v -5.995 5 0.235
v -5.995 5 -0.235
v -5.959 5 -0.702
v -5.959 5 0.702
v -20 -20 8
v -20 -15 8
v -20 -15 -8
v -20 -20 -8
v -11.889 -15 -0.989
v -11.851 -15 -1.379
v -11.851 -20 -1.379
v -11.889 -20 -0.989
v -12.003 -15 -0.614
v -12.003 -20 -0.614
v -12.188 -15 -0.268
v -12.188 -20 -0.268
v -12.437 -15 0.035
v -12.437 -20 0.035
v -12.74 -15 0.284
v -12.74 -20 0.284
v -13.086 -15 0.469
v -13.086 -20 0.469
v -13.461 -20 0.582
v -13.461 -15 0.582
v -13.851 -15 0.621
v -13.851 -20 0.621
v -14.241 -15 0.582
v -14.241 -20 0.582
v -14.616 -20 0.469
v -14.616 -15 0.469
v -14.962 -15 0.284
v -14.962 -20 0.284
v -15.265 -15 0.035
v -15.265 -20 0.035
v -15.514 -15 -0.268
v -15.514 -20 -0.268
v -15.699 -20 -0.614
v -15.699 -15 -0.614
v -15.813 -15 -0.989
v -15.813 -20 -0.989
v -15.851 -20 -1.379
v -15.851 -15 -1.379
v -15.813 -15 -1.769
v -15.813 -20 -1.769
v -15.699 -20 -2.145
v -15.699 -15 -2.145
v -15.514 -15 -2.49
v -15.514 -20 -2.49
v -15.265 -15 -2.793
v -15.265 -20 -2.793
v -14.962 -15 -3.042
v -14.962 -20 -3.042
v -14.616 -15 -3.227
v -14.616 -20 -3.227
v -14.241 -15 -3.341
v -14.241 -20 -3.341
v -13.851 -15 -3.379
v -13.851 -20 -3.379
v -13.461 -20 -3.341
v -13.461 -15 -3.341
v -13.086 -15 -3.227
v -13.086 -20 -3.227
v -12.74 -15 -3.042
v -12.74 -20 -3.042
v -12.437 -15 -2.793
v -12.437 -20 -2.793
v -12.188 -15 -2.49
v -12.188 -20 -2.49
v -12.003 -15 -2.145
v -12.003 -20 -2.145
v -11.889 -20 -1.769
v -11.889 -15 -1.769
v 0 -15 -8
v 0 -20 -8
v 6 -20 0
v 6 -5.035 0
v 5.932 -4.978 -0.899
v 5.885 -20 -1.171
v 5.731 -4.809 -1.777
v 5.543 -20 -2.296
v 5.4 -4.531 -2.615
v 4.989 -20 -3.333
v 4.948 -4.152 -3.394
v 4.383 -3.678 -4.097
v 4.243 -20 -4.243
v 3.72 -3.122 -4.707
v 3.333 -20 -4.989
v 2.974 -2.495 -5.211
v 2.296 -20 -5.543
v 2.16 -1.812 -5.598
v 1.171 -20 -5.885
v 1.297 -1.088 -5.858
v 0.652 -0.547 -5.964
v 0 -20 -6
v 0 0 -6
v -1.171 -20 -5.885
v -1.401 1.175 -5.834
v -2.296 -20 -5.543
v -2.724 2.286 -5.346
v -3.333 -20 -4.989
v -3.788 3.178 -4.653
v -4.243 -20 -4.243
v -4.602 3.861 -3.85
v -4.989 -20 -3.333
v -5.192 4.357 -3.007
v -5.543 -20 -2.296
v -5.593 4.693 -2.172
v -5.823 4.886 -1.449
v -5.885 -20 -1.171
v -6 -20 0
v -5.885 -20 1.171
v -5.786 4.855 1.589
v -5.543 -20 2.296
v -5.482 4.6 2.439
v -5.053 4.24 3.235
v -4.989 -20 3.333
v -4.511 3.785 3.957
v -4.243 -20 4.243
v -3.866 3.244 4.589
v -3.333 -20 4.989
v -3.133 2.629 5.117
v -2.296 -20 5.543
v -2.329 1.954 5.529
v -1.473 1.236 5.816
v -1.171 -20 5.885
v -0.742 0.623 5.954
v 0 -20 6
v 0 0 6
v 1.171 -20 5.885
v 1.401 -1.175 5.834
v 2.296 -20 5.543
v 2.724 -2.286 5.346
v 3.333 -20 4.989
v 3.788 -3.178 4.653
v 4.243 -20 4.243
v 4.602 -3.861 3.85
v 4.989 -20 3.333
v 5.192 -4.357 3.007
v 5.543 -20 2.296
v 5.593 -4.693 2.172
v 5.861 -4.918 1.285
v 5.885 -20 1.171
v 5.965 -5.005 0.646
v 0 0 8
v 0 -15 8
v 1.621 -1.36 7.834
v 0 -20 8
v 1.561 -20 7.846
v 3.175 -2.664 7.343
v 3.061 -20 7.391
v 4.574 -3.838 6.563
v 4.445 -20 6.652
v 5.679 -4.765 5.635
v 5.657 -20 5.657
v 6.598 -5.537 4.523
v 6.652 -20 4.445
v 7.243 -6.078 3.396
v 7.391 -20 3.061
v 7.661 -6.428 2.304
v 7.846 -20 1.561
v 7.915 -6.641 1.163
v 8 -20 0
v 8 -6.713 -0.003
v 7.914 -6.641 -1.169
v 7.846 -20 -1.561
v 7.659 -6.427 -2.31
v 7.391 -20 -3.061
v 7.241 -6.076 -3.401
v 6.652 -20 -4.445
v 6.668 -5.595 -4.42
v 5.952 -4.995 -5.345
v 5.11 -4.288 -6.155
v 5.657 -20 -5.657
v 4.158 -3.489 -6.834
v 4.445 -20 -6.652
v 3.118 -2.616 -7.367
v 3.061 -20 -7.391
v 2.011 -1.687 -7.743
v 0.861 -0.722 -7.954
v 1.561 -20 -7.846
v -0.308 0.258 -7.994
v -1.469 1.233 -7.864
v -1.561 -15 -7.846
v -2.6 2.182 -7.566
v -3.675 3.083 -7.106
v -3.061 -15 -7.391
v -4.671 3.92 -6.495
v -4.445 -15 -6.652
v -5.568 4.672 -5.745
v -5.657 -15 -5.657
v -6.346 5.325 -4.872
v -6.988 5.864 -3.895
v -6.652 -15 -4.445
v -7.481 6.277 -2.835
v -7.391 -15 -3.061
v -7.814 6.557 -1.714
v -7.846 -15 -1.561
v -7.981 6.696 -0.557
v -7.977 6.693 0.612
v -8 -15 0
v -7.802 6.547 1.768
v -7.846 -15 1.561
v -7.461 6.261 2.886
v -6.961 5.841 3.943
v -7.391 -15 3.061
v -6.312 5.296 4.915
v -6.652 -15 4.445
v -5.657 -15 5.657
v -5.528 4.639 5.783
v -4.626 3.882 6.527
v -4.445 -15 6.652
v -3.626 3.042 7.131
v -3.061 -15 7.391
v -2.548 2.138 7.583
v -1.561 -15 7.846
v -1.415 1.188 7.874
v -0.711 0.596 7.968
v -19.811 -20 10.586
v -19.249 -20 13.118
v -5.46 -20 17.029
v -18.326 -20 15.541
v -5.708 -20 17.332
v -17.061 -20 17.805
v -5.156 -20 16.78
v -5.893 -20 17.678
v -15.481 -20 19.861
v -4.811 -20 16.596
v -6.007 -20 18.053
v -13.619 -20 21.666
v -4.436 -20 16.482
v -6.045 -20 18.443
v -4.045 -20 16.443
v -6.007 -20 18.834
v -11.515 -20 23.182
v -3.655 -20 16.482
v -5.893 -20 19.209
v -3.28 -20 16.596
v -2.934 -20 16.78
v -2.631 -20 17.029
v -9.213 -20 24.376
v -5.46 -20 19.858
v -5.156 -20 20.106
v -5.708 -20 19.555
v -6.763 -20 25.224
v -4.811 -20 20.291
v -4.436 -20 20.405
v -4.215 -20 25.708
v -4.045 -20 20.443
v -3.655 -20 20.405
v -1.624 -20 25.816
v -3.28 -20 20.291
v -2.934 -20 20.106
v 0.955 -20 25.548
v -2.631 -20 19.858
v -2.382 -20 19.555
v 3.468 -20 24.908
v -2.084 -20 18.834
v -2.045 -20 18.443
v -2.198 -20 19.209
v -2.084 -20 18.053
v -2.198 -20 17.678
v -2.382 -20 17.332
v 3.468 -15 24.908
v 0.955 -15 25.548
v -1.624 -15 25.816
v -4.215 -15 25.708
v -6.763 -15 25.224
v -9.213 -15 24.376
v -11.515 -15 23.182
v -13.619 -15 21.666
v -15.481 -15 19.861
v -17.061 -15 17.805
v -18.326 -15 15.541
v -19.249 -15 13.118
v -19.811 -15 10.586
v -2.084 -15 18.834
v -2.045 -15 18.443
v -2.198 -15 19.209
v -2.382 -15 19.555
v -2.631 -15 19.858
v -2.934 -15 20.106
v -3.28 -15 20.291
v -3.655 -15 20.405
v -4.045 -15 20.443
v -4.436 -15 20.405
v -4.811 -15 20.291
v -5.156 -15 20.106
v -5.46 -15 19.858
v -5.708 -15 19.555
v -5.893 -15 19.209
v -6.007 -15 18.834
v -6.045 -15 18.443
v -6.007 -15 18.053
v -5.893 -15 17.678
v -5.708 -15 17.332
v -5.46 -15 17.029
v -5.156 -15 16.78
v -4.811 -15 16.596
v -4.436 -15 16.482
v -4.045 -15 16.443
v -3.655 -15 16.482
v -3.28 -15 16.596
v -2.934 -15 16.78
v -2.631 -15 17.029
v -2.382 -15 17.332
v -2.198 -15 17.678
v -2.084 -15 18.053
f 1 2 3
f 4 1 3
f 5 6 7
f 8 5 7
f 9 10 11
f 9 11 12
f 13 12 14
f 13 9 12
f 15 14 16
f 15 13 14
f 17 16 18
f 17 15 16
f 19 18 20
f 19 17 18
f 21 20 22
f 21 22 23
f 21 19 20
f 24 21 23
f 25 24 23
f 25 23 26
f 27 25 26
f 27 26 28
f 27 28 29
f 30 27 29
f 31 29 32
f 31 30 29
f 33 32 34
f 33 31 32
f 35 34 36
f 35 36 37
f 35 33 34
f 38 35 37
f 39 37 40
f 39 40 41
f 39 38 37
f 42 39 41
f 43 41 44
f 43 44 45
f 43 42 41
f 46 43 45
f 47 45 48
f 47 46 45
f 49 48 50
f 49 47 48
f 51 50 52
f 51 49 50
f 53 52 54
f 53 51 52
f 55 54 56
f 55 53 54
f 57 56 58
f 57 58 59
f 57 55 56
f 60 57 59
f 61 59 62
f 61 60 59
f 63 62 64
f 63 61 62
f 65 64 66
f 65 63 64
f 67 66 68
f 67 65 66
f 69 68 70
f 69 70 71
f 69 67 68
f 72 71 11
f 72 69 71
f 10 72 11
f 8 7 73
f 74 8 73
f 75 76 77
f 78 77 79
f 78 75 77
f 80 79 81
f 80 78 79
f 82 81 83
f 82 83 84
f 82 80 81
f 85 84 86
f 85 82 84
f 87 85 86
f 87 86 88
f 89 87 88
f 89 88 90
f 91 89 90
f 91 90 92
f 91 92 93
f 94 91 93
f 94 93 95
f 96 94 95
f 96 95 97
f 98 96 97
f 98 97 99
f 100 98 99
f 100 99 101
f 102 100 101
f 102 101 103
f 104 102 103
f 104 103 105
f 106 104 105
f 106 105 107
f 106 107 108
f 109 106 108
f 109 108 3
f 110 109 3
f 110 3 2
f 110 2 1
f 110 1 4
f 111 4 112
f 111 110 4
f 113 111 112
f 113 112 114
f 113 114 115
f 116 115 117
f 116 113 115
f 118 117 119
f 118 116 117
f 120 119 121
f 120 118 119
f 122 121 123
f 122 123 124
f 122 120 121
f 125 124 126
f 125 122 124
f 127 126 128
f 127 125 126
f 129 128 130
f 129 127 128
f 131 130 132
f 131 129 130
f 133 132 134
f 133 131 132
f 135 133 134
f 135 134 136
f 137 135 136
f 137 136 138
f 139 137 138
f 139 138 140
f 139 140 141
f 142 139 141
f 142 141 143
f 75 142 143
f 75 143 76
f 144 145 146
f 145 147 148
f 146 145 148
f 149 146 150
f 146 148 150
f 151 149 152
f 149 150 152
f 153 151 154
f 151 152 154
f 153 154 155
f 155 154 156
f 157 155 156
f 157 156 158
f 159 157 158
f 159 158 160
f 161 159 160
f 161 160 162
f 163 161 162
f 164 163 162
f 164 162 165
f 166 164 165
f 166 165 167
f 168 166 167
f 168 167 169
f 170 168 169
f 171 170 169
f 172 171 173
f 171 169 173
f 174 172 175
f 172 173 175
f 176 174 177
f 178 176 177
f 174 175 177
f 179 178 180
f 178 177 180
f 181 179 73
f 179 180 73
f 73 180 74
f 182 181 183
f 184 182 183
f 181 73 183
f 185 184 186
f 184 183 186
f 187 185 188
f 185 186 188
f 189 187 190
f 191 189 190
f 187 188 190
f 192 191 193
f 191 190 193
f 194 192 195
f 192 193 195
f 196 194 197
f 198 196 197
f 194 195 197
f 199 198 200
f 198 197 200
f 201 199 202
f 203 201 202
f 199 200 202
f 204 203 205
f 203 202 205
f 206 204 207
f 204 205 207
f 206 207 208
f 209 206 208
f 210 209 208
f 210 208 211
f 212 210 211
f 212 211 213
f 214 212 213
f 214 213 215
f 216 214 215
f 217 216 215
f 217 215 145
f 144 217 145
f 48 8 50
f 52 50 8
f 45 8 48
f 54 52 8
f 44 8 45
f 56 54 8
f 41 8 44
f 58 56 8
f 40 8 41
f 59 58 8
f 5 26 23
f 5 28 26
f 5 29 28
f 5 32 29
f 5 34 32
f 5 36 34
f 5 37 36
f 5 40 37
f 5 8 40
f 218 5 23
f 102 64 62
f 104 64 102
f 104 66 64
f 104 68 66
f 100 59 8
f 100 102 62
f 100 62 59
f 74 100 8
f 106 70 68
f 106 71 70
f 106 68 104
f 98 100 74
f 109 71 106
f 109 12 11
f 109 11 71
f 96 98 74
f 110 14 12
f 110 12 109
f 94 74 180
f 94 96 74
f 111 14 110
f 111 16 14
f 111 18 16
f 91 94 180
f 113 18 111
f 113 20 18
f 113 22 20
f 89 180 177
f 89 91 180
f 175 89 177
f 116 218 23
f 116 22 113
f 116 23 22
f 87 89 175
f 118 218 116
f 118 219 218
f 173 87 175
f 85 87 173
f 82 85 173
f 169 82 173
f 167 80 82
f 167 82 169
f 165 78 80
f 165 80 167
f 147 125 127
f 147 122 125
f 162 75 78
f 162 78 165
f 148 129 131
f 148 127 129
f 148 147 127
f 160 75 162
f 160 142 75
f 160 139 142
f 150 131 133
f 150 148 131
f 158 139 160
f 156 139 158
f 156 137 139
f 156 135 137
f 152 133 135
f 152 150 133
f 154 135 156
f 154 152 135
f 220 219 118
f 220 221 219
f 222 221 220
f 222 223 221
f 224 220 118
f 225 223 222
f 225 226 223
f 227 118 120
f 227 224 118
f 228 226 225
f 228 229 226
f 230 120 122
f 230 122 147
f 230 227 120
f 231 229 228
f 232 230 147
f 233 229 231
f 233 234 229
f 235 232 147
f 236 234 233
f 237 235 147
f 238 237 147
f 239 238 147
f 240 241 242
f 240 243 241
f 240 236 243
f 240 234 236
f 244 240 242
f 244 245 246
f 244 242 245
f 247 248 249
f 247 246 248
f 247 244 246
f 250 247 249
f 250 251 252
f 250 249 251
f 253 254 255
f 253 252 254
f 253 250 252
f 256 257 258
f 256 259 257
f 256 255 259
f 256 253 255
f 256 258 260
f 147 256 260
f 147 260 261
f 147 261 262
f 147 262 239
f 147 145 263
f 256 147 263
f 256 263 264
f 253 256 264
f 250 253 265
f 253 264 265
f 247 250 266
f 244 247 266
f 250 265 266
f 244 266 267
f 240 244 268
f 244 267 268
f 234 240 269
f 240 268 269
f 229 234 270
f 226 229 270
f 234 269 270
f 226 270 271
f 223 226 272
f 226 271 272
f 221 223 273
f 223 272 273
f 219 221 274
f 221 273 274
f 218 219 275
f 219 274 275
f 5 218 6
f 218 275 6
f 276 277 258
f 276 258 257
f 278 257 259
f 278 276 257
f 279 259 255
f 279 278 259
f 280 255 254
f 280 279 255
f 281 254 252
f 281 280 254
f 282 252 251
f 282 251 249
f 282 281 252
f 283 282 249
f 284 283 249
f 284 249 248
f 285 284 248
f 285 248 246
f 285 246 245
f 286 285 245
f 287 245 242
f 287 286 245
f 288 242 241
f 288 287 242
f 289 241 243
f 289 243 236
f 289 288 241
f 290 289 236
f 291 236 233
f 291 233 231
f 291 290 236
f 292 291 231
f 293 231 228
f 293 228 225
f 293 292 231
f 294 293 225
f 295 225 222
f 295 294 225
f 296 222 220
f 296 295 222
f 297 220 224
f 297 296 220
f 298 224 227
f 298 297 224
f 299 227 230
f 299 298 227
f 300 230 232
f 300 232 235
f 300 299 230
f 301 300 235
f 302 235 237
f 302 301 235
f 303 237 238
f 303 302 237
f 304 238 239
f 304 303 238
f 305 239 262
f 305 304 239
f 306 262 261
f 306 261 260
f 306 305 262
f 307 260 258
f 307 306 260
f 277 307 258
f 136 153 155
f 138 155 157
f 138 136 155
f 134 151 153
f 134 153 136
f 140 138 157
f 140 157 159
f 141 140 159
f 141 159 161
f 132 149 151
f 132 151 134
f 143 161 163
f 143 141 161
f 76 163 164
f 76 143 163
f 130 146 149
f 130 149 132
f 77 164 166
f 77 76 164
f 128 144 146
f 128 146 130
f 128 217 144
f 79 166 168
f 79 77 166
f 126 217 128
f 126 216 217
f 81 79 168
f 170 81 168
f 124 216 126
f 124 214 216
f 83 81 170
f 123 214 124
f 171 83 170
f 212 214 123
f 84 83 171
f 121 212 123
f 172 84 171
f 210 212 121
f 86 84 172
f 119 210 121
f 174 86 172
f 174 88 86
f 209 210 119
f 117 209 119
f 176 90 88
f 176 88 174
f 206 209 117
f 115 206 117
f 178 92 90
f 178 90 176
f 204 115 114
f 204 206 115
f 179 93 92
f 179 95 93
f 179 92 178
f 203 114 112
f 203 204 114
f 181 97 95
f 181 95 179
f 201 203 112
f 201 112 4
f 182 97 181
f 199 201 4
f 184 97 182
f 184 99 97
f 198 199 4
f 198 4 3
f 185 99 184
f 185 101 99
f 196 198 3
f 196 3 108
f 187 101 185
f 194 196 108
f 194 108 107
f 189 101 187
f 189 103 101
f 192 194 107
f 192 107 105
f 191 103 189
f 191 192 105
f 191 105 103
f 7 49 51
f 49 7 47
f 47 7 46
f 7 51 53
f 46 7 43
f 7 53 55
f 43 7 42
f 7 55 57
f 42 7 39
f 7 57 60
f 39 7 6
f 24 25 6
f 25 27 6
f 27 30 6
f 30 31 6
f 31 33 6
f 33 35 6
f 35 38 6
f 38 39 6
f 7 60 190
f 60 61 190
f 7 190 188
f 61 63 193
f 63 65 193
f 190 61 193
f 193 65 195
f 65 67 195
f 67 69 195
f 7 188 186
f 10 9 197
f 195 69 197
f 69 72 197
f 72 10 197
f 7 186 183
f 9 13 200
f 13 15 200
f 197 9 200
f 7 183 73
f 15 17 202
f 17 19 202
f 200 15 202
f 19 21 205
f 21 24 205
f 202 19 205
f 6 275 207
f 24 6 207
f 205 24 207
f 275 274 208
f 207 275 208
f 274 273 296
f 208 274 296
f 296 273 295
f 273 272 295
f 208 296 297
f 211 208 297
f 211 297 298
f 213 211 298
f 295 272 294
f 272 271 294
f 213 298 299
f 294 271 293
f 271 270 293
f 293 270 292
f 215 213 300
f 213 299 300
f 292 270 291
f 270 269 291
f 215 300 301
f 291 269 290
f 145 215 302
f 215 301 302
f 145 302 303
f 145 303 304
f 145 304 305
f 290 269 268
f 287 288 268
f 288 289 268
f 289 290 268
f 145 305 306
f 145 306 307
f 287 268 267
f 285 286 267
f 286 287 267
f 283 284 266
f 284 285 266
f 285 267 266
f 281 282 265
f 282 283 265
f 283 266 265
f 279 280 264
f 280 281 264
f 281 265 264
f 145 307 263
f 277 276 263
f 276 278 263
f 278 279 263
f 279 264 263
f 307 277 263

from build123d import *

# Parameters (mm, degrees)
BOSS_EXTRUDE1_DEPTH      = 30
BOSS_EXTRUDE1_DEPTH_BACK = 20
SKETCH1_R                = 8
SKETCH1_4_R              = 6
SKETCH2_R                = 6
SKETCH1_5_R              = 6
CUT_EXTRUDE1_DEPTH       = 5
BOSS_EXTRUDE3_START      = -5
BOSS_EXTRUDE3_OUTLINE_R  = 2
BOSS_EXTRUDE3_DEPTH      = 5


# Read off the part's stored shape, not the designer's step: Boss-Extrude3
with BuildPart() as part:
    # Sketch1 → Boss-Extrude1 (new, two sides: drawn at the far end of the back side and taken through both)
    with BuildSketch(Plane(origin=(0, 0, 0), x_dir=(1, 0, 0), z_dir=(0, 1, 0)).offset(-BOSS_EXTRUDE1_DEPTH_BACK)):
        with Locations(Location((0, 0, 0), (0, 0, 270))):
            Circle(SKETCH1_R)
    extrude(amount=BOSS_EXTRUDE1_DEPTH + BOSS_EXTRUDE1_DEPTH_BACK)

    # SurfaceCut1
    split(bisect_by=Plane(origin=(0, 0, 0), x_dir=(0, 0, -1), z_dir=(0.6427876096865405, 0.766044443118977, -2.2049215546234306e-15)), keep=Keep.BOTTOM)

    # Sketch1<4> → Cut-Loft1 section 0
    with BuildSketch(Plane(origin=(0, 0, 0), x_dir=(1, 0, 0), z_dir=(0, 1, 0))):
        Circle(SKETCH1_4_R)
    # Sketch2 → Cut-Loft1 section 1
    with BuildSketch(Plane.XZ.offset(20)):
        Circle(SKETCH2_R)
    loft(mode=Mode.SUBTRACT)

    # Sketch1<5> → Cut-Extrude1 (cut)
    with BuildSketch(Plane(origin=(0, 0, 0), x_dir=(1, 0, 0), z_dir=(0, 1, 0))):
        with Locations(Location((0, 0, 0), (0, 0, 90))):
            Circle(SKETCH1_5_R)
    extrude(amount=CUT_EXTRUDE1_DEPTH, mode=Mode.SUBTRACT)

    # Boss-Extrude3 outline → Boss-Extrude3 (add)
    with BuildSketch(Plane.XZ.offset(20).offset(BOSS_EXTRUDE3_START)):
        with BuildLine():
            Line((-20, -8), (0, -8))
            ThreePointArc((0, -8), (-8, 0), (0, 8))
            Line((0, 8), (3.468102534, 24.907883087))
            ThreePointArc((3.468102534, 24.907883087), (-12.594718707, 22.462264233), (-20, 8))
            Line((-20, 8), (-20, -8))
        make_face()
        with Locations((-13.851036571, -1.379219301)):
            Circle(BOSS_EXTRUDE3_OUTLINE_R, mode=Mode.SUBTRACT)
        with Locations((-4.045326452, 18.443425538)):
            Circle(BOSS_EXTRUDE3_OUTLINE_R, mode=Mode.SUBTRACT)
    extrude(amount=BOSS_EXTRUDE3_DEPTH)


solid = part.part
